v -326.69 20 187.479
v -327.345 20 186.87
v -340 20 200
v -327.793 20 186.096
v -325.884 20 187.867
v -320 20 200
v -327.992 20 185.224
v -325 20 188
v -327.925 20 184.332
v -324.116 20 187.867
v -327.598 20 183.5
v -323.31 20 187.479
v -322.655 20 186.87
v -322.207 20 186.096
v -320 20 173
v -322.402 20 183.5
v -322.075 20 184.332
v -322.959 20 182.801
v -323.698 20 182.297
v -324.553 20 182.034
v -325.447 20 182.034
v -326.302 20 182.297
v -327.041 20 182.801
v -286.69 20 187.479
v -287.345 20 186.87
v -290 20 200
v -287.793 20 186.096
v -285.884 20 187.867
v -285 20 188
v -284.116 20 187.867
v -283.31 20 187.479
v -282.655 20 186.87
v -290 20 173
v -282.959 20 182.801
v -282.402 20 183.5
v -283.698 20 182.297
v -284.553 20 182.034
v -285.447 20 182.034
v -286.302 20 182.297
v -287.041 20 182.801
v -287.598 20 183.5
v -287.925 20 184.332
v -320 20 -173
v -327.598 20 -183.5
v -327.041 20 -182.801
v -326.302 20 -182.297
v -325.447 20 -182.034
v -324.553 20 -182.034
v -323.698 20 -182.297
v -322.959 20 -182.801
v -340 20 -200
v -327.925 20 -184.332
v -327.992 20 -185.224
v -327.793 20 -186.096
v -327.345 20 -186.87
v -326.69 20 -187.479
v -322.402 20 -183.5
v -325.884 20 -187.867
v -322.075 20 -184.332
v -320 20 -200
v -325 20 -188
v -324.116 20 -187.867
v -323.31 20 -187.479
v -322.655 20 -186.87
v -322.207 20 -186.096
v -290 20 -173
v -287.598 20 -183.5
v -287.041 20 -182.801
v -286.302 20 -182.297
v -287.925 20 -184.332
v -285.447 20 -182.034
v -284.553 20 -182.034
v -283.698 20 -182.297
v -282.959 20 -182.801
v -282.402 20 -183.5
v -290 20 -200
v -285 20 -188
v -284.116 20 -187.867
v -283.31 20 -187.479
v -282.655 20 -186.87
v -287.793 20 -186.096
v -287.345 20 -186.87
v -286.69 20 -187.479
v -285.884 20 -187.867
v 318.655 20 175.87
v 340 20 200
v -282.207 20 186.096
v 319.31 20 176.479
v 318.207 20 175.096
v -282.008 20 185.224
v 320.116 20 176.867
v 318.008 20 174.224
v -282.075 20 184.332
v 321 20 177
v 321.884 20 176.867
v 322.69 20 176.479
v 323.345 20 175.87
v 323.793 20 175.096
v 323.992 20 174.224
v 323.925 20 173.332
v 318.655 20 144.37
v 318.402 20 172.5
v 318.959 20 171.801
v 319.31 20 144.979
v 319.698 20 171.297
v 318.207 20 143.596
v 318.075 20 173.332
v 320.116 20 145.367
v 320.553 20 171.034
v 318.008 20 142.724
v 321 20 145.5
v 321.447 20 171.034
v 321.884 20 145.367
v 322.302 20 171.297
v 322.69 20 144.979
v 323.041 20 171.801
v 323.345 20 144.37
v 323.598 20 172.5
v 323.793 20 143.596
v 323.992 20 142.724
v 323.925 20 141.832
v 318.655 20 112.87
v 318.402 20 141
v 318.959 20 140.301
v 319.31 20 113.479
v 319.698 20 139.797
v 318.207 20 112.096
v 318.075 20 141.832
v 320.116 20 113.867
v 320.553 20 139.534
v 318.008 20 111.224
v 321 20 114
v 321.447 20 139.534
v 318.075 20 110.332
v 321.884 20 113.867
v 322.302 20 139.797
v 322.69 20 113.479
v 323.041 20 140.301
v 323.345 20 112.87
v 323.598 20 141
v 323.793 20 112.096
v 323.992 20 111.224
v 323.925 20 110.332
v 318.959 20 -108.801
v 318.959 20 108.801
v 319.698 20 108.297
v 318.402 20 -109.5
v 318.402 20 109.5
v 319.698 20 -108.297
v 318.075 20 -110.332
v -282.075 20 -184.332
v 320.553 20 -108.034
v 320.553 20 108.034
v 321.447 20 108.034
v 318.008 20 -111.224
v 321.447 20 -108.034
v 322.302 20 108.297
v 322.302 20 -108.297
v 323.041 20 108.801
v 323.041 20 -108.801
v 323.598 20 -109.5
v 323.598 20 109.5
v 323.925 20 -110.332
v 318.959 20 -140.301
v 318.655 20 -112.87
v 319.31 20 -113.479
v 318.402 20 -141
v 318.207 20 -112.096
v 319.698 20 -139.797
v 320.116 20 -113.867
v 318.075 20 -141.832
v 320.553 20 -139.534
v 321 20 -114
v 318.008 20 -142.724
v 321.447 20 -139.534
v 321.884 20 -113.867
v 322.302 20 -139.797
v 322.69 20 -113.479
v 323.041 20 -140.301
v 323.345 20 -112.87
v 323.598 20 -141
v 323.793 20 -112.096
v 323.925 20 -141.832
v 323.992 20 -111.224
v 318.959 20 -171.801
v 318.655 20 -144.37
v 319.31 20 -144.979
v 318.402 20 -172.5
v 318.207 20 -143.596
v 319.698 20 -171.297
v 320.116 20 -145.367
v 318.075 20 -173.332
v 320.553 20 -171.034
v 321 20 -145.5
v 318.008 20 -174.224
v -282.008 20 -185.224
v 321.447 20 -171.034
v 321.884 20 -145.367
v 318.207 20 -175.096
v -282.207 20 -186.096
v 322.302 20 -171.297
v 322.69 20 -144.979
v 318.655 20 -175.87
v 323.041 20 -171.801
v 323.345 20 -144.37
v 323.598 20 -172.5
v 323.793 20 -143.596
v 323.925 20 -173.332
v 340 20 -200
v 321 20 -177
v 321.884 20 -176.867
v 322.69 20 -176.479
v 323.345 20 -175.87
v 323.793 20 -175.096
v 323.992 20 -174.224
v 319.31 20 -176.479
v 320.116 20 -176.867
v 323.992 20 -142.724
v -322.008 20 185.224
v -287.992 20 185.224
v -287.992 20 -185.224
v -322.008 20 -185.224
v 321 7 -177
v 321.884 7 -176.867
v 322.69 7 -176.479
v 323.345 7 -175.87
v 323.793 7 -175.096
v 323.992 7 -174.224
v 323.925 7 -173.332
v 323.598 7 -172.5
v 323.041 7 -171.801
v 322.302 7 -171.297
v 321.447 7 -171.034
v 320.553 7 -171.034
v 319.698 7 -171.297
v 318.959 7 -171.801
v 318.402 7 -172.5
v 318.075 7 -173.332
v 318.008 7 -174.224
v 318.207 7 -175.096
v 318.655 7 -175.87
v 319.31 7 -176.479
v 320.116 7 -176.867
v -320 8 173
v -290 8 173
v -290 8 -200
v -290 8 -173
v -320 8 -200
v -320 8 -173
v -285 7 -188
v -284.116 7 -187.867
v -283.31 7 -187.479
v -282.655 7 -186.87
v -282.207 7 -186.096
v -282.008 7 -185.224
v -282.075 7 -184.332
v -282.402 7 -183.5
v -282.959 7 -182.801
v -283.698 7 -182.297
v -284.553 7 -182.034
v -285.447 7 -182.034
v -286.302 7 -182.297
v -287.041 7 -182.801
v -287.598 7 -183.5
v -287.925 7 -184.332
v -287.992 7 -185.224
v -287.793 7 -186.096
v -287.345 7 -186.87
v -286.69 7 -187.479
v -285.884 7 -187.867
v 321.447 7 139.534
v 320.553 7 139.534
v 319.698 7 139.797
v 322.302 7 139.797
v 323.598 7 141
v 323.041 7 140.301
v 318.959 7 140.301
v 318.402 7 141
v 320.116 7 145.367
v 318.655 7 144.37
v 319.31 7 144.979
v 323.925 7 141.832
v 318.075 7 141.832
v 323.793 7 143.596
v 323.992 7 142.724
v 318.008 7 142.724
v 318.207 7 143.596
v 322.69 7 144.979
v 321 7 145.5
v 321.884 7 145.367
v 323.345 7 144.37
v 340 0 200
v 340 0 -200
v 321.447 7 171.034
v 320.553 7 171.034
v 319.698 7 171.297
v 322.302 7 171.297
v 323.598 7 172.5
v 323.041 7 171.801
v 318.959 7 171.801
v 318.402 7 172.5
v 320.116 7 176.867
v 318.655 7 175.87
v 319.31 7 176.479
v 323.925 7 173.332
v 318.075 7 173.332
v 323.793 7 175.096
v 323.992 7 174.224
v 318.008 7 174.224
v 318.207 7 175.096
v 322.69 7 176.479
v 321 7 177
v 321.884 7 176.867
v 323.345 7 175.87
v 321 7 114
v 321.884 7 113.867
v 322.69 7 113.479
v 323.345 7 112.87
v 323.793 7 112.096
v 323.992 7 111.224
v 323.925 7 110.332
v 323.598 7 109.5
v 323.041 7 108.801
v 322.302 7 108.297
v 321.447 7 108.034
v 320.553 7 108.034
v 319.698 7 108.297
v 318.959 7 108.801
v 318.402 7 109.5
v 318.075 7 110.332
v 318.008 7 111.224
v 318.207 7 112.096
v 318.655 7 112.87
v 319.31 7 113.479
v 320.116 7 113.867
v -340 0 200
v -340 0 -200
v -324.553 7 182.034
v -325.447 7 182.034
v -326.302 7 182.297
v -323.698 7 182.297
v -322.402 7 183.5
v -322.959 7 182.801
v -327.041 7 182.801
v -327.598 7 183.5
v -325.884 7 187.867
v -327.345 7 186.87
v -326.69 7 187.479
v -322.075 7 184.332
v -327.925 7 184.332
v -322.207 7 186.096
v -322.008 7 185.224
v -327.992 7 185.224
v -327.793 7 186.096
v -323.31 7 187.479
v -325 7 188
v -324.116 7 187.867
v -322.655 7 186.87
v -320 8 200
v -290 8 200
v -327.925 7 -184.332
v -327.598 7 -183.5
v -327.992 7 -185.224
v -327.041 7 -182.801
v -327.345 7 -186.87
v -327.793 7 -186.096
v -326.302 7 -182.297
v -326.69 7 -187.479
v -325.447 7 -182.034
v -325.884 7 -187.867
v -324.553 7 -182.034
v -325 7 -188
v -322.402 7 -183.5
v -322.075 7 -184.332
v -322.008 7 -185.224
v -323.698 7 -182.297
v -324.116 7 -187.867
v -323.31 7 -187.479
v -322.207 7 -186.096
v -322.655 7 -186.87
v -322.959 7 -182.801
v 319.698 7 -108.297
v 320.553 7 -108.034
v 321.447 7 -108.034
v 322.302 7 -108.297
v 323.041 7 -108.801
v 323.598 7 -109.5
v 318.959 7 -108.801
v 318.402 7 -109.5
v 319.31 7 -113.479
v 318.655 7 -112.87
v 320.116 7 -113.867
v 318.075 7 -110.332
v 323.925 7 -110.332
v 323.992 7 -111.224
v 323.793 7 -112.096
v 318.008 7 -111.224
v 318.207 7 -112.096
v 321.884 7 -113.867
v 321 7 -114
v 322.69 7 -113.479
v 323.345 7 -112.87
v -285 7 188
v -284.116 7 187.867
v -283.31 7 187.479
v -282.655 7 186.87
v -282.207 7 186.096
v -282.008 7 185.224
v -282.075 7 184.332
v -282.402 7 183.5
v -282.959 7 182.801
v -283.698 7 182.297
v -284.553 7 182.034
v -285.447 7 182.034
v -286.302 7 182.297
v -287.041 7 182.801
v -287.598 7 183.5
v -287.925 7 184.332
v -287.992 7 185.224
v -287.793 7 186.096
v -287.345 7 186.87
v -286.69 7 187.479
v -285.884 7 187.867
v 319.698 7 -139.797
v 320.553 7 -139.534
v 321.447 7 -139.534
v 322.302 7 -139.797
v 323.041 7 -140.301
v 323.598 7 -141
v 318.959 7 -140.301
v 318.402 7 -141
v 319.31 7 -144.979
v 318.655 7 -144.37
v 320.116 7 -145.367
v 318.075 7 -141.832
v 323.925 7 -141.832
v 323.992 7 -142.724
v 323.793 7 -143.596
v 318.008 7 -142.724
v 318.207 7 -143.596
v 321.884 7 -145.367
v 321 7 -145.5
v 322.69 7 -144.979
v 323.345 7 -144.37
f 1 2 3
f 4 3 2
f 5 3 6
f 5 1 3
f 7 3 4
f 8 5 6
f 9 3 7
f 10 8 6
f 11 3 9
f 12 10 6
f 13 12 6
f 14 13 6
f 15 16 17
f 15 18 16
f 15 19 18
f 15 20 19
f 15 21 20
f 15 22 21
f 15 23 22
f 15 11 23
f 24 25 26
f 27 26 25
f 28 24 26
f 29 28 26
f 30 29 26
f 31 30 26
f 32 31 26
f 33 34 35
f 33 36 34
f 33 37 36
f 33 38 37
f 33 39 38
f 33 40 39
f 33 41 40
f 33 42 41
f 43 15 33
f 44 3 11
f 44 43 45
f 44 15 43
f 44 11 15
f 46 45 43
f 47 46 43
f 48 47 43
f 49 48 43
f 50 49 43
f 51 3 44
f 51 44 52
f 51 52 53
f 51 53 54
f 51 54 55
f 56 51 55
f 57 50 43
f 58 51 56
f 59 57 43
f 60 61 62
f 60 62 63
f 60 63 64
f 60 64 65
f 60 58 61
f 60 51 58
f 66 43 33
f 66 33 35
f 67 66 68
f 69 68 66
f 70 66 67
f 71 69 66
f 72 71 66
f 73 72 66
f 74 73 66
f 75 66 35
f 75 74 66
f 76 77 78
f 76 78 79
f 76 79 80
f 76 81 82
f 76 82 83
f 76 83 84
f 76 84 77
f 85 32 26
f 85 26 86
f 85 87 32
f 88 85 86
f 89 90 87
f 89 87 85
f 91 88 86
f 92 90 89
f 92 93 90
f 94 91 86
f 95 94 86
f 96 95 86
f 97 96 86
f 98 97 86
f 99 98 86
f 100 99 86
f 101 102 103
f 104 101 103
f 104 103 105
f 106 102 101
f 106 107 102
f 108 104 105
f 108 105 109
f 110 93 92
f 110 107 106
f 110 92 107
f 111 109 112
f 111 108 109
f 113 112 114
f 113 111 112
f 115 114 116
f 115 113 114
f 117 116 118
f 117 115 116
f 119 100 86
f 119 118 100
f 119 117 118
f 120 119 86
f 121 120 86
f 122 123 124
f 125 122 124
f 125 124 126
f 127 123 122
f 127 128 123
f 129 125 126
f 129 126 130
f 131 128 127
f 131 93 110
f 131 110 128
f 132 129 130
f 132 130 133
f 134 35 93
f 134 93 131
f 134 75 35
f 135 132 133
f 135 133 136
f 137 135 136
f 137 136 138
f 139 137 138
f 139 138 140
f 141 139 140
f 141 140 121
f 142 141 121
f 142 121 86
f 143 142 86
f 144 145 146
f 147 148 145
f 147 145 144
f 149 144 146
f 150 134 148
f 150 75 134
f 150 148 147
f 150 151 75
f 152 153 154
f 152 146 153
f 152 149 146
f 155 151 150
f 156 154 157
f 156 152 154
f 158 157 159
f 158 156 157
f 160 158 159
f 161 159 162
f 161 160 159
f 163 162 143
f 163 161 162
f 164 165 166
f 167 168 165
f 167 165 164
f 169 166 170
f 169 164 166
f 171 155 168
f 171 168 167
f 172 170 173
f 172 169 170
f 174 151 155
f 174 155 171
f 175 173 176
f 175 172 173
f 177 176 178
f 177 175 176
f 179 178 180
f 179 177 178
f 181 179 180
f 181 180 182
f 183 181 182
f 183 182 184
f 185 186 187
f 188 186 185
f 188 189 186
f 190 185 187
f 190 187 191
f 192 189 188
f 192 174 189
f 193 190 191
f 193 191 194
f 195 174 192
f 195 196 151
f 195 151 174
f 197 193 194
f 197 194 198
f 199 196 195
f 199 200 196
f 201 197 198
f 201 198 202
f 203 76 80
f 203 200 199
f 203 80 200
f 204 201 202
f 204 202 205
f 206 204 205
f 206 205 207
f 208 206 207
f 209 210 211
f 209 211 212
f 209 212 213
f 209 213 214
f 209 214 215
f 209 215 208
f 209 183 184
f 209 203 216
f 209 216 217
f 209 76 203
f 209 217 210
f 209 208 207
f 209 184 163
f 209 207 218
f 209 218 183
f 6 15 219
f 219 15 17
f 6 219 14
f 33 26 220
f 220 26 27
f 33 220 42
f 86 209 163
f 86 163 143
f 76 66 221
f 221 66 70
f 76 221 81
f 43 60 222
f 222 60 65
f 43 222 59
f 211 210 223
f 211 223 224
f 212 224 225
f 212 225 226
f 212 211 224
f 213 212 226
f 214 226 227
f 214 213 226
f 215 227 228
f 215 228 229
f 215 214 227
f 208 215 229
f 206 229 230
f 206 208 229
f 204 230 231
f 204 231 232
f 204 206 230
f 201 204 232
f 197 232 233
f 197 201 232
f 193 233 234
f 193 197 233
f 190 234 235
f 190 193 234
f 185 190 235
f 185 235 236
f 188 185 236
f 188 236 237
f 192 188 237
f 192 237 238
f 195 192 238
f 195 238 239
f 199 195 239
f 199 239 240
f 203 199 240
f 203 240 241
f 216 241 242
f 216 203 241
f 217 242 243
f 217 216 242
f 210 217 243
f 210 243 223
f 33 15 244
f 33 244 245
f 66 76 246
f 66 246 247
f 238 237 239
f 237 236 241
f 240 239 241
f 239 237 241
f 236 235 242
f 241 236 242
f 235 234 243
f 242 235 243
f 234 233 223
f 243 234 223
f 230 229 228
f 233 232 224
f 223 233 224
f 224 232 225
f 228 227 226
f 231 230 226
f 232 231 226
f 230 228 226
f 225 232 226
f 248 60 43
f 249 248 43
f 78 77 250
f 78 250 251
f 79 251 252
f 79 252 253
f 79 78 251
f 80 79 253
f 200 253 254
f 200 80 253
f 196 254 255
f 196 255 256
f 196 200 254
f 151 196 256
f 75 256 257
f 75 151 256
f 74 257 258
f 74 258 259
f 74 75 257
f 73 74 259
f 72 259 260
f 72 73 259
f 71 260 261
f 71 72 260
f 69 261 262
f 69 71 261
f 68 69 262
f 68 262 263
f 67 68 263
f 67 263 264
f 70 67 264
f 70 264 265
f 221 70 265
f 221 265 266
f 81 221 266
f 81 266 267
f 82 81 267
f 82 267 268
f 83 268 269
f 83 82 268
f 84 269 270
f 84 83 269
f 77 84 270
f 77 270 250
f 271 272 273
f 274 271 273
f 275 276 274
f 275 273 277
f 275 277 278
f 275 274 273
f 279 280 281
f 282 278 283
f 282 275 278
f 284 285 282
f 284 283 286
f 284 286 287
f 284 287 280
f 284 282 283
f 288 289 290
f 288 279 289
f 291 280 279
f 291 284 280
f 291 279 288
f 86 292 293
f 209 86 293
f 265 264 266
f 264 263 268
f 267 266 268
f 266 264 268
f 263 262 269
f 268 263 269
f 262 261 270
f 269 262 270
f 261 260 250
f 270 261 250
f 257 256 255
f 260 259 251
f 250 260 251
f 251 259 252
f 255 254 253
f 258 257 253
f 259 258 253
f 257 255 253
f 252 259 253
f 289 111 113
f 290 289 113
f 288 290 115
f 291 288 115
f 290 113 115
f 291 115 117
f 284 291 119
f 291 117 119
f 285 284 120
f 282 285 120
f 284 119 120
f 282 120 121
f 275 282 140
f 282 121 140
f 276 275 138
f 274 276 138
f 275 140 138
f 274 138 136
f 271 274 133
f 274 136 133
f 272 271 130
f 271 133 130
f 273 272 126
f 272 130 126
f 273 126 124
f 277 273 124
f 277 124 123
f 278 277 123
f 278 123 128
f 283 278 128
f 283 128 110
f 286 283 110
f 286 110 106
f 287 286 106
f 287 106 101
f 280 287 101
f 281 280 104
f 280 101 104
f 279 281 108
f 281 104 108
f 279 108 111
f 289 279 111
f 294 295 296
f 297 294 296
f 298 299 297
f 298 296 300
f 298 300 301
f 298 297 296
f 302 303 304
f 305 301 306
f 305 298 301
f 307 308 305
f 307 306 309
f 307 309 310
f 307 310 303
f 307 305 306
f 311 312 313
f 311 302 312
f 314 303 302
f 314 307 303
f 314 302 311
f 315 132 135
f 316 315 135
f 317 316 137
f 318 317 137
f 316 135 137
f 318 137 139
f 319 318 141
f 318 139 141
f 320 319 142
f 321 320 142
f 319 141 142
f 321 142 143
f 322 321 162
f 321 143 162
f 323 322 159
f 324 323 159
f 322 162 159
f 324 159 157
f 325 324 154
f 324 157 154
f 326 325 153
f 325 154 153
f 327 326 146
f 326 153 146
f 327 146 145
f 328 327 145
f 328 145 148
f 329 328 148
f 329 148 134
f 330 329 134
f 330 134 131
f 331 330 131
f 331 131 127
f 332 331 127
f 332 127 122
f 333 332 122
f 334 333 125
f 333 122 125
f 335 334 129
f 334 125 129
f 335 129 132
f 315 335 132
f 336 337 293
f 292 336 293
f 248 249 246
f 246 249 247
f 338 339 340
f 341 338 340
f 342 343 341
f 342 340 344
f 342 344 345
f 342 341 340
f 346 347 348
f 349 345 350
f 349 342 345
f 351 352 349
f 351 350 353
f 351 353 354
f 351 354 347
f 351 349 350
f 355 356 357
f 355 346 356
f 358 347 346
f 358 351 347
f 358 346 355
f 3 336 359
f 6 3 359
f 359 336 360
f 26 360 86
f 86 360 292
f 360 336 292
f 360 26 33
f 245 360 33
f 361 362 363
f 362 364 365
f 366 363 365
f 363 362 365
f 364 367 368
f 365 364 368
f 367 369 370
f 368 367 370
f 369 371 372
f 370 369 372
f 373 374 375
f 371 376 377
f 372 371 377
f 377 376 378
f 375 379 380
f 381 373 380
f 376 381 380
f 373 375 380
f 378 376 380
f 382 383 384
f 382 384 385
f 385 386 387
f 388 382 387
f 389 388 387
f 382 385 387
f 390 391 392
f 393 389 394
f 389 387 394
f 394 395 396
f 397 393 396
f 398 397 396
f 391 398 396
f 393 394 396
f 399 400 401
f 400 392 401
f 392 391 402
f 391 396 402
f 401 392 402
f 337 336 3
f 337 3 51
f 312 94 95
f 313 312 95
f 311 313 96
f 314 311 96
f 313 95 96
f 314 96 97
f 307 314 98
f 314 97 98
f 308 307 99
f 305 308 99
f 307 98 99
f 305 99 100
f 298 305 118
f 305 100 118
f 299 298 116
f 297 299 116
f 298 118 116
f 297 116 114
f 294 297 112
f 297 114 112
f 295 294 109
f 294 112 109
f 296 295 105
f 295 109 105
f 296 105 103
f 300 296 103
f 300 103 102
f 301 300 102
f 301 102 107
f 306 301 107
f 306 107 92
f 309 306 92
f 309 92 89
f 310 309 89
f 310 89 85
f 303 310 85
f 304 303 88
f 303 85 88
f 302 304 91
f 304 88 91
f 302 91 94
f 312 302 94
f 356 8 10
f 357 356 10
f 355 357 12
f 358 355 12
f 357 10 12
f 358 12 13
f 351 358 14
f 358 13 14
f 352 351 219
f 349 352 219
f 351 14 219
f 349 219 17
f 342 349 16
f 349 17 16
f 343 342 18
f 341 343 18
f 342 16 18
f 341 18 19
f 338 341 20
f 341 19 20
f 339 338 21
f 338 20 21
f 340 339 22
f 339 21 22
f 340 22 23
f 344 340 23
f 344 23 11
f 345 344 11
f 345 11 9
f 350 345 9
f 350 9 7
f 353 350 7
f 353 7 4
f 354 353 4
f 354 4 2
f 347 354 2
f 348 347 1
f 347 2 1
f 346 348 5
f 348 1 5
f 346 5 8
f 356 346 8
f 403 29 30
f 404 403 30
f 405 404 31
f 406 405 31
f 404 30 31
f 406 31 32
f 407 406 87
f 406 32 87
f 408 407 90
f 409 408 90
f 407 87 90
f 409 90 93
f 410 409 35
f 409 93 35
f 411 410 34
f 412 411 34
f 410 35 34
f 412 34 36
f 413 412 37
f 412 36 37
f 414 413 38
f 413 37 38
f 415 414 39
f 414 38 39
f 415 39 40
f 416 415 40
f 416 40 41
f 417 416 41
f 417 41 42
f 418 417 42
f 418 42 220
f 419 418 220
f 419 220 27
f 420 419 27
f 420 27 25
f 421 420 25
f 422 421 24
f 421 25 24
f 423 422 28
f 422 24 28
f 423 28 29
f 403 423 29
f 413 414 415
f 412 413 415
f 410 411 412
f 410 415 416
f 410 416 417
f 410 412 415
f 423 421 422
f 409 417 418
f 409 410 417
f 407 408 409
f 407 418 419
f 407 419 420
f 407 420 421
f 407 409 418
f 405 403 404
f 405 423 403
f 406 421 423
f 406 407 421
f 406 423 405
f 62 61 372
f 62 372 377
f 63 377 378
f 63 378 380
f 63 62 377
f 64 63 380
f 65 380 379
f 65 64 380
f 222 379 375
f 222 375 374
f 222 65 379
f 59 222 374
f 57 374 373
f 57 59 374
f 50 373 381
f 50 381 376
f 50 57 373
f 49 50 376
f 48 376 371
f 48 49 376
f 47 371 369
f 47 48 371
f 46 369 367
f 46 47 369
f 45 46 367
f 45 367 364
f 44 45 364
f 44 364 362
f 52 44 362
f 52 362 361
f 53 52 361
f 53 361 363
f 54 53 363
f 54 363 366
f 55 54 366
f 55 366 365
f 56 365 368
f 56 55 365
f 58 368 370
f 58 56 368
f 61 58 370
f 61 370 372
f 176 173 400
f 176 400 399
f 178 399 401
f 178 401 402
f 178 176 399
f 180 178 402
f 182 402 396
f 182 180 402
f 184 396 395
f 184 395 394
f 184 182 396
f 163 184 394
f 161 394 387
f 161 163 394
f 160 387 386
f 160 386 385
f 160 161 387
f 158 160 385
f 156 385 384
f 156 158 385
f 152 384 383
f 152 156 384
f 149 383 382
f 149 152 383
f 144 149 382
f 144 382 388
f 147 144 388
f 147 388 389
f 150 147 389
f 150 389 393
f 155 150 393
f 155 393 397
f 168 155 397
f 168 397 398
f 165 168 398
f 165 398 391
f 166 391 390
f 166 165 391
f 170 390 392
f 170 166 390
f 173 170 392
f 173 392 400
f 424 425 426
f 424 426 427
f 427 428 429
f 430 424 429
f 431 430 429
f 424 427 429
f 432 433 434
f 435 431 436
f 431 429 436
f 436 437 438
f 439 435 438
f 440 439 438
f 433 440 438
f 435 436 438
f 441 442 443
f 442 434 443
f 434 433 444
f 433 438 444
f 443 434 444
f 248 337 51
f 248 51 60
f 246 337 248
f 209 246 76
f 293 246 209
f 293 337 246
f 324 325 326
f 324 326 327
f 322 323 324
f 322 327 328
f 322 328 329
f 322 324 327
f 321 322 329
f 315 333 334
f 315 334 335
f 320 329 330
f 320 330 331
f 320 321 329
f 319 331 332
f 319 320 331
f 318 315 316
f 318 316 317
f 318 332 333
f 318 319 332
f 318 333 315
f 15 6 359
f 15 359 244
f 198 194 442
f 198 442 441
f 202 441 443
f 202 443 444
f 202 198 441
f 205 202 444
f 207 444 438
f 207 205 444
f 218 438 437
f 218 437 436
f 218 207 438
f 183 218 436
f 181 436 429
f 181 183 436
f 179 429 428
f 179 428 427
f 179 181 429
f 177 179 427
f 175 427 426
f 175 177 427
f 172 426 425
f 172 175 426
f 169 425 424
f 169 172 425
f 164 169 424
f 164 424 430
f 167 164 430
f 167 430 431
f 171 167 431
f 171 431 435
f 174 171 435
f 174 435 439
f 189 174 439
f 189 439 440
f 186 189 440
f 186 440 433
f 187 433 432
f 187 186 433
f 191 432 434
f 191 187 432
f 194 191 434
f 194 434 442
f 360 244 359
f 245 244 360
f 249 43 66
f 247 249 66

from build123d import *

# Parameters (mm, degrees)
SKETCH1_W           = 680
SKETCH1_H           = 400
BOSS_EXTRUDE1_DEPTH = 20
SKETCH2_W           = 30
SKETCH2_H           = 27
CUT_EXTRUDE1_DEPTH  = 12
SKETCH3_R           = 3
CUT_EXTRUDE2_DEPTH  = 13
SKETCH4_R           = 3
CUT_EXTRUDE3_DEPTH  = 13


with BuildPart() as part:
    # Sketch1 → Boss-Extrude1 (new body)
    with BuildSketch(Plane(origin=(0, 0, 0), x_dir=(1, 0, 0), z_dir=(0, 1, 0))):
        Rectangle(SKETCH1_W, SKETCH1_H)
    extrude(amount=BOSS_EXTRUDE1_DEPTH)

    # Sketch2 → Cut-Extrude1 (cut)
    with BuildSketch(Plane(origin=(0, 20, 0), x_dir=(1, 0, 0), z_dir=(0, 1, 0))):
        with Locations((-305, -186.5)):
            Rectangle(SKETCH2_W, SKETCH2_H)
    cut_extrude1 = extrude(amount=-CUT_EXTRUDE1_DEPTH, mode=Mode.SUBTRACT)

    # Mirror1: Cut-Extrude1 across plane
    add(cut_extrude1.mirror(Plane.XY), mode=Mode.SUBTRACT)

    # Sketch3 → Cut-Extrude2 (cut)
    with BuildSketch(Plane(origin=(0, 20, 0), x_dir=(1, 0, 0), z_dir=(0, 1, 0))):
        with Locations(Location((321, -174, 0), (0, 0, 270))):
            Circle(SKETCH3_R)
        with Locations(Location((321, -142.5, 0), (0, 0, 270))):
            Circle(SKETCH3_R)
        with Locations(Location((321, -111, 0), (0, 0, 270))):
            Circle(SKETCH3_R)
    cut_extrude2 = extrude(amount=-CUT_EXTRUDE2_DEPTH, mode=Mode.SUBTRACT)

    # Mirror2: Cut-Extrude2 across plane
    add(cut_extrude2.mirror(Plane.XY), mode=Mode.SUBTRACT)

    # Sketch4 → Cut-Extrude3 (cut)
    with BuildSketch(Plane(origin=(0, 20, 0), x_dir=(1, 0, 0), z_dir=(0, 1, 0))):
        with Locations(Location((-325, -185, 0), (0, 0, 270))):
            Circle(SKETCH4_R)
        with Locations(Location((-285, -185, 0), (0, 0, 270))):
            Circle(SKETCH4_R)
    cut_extrude3 = extrude(amount=-CUT_EXTRUDE3_DEPTH, mode=Mode.SUBTRACT)

    # Mirror3: Cut-Extrude3 across plane
    add(cut_extrude3.mirror(Plane.XY), mode=Mode.SUBTRACT)


solid = part.part
